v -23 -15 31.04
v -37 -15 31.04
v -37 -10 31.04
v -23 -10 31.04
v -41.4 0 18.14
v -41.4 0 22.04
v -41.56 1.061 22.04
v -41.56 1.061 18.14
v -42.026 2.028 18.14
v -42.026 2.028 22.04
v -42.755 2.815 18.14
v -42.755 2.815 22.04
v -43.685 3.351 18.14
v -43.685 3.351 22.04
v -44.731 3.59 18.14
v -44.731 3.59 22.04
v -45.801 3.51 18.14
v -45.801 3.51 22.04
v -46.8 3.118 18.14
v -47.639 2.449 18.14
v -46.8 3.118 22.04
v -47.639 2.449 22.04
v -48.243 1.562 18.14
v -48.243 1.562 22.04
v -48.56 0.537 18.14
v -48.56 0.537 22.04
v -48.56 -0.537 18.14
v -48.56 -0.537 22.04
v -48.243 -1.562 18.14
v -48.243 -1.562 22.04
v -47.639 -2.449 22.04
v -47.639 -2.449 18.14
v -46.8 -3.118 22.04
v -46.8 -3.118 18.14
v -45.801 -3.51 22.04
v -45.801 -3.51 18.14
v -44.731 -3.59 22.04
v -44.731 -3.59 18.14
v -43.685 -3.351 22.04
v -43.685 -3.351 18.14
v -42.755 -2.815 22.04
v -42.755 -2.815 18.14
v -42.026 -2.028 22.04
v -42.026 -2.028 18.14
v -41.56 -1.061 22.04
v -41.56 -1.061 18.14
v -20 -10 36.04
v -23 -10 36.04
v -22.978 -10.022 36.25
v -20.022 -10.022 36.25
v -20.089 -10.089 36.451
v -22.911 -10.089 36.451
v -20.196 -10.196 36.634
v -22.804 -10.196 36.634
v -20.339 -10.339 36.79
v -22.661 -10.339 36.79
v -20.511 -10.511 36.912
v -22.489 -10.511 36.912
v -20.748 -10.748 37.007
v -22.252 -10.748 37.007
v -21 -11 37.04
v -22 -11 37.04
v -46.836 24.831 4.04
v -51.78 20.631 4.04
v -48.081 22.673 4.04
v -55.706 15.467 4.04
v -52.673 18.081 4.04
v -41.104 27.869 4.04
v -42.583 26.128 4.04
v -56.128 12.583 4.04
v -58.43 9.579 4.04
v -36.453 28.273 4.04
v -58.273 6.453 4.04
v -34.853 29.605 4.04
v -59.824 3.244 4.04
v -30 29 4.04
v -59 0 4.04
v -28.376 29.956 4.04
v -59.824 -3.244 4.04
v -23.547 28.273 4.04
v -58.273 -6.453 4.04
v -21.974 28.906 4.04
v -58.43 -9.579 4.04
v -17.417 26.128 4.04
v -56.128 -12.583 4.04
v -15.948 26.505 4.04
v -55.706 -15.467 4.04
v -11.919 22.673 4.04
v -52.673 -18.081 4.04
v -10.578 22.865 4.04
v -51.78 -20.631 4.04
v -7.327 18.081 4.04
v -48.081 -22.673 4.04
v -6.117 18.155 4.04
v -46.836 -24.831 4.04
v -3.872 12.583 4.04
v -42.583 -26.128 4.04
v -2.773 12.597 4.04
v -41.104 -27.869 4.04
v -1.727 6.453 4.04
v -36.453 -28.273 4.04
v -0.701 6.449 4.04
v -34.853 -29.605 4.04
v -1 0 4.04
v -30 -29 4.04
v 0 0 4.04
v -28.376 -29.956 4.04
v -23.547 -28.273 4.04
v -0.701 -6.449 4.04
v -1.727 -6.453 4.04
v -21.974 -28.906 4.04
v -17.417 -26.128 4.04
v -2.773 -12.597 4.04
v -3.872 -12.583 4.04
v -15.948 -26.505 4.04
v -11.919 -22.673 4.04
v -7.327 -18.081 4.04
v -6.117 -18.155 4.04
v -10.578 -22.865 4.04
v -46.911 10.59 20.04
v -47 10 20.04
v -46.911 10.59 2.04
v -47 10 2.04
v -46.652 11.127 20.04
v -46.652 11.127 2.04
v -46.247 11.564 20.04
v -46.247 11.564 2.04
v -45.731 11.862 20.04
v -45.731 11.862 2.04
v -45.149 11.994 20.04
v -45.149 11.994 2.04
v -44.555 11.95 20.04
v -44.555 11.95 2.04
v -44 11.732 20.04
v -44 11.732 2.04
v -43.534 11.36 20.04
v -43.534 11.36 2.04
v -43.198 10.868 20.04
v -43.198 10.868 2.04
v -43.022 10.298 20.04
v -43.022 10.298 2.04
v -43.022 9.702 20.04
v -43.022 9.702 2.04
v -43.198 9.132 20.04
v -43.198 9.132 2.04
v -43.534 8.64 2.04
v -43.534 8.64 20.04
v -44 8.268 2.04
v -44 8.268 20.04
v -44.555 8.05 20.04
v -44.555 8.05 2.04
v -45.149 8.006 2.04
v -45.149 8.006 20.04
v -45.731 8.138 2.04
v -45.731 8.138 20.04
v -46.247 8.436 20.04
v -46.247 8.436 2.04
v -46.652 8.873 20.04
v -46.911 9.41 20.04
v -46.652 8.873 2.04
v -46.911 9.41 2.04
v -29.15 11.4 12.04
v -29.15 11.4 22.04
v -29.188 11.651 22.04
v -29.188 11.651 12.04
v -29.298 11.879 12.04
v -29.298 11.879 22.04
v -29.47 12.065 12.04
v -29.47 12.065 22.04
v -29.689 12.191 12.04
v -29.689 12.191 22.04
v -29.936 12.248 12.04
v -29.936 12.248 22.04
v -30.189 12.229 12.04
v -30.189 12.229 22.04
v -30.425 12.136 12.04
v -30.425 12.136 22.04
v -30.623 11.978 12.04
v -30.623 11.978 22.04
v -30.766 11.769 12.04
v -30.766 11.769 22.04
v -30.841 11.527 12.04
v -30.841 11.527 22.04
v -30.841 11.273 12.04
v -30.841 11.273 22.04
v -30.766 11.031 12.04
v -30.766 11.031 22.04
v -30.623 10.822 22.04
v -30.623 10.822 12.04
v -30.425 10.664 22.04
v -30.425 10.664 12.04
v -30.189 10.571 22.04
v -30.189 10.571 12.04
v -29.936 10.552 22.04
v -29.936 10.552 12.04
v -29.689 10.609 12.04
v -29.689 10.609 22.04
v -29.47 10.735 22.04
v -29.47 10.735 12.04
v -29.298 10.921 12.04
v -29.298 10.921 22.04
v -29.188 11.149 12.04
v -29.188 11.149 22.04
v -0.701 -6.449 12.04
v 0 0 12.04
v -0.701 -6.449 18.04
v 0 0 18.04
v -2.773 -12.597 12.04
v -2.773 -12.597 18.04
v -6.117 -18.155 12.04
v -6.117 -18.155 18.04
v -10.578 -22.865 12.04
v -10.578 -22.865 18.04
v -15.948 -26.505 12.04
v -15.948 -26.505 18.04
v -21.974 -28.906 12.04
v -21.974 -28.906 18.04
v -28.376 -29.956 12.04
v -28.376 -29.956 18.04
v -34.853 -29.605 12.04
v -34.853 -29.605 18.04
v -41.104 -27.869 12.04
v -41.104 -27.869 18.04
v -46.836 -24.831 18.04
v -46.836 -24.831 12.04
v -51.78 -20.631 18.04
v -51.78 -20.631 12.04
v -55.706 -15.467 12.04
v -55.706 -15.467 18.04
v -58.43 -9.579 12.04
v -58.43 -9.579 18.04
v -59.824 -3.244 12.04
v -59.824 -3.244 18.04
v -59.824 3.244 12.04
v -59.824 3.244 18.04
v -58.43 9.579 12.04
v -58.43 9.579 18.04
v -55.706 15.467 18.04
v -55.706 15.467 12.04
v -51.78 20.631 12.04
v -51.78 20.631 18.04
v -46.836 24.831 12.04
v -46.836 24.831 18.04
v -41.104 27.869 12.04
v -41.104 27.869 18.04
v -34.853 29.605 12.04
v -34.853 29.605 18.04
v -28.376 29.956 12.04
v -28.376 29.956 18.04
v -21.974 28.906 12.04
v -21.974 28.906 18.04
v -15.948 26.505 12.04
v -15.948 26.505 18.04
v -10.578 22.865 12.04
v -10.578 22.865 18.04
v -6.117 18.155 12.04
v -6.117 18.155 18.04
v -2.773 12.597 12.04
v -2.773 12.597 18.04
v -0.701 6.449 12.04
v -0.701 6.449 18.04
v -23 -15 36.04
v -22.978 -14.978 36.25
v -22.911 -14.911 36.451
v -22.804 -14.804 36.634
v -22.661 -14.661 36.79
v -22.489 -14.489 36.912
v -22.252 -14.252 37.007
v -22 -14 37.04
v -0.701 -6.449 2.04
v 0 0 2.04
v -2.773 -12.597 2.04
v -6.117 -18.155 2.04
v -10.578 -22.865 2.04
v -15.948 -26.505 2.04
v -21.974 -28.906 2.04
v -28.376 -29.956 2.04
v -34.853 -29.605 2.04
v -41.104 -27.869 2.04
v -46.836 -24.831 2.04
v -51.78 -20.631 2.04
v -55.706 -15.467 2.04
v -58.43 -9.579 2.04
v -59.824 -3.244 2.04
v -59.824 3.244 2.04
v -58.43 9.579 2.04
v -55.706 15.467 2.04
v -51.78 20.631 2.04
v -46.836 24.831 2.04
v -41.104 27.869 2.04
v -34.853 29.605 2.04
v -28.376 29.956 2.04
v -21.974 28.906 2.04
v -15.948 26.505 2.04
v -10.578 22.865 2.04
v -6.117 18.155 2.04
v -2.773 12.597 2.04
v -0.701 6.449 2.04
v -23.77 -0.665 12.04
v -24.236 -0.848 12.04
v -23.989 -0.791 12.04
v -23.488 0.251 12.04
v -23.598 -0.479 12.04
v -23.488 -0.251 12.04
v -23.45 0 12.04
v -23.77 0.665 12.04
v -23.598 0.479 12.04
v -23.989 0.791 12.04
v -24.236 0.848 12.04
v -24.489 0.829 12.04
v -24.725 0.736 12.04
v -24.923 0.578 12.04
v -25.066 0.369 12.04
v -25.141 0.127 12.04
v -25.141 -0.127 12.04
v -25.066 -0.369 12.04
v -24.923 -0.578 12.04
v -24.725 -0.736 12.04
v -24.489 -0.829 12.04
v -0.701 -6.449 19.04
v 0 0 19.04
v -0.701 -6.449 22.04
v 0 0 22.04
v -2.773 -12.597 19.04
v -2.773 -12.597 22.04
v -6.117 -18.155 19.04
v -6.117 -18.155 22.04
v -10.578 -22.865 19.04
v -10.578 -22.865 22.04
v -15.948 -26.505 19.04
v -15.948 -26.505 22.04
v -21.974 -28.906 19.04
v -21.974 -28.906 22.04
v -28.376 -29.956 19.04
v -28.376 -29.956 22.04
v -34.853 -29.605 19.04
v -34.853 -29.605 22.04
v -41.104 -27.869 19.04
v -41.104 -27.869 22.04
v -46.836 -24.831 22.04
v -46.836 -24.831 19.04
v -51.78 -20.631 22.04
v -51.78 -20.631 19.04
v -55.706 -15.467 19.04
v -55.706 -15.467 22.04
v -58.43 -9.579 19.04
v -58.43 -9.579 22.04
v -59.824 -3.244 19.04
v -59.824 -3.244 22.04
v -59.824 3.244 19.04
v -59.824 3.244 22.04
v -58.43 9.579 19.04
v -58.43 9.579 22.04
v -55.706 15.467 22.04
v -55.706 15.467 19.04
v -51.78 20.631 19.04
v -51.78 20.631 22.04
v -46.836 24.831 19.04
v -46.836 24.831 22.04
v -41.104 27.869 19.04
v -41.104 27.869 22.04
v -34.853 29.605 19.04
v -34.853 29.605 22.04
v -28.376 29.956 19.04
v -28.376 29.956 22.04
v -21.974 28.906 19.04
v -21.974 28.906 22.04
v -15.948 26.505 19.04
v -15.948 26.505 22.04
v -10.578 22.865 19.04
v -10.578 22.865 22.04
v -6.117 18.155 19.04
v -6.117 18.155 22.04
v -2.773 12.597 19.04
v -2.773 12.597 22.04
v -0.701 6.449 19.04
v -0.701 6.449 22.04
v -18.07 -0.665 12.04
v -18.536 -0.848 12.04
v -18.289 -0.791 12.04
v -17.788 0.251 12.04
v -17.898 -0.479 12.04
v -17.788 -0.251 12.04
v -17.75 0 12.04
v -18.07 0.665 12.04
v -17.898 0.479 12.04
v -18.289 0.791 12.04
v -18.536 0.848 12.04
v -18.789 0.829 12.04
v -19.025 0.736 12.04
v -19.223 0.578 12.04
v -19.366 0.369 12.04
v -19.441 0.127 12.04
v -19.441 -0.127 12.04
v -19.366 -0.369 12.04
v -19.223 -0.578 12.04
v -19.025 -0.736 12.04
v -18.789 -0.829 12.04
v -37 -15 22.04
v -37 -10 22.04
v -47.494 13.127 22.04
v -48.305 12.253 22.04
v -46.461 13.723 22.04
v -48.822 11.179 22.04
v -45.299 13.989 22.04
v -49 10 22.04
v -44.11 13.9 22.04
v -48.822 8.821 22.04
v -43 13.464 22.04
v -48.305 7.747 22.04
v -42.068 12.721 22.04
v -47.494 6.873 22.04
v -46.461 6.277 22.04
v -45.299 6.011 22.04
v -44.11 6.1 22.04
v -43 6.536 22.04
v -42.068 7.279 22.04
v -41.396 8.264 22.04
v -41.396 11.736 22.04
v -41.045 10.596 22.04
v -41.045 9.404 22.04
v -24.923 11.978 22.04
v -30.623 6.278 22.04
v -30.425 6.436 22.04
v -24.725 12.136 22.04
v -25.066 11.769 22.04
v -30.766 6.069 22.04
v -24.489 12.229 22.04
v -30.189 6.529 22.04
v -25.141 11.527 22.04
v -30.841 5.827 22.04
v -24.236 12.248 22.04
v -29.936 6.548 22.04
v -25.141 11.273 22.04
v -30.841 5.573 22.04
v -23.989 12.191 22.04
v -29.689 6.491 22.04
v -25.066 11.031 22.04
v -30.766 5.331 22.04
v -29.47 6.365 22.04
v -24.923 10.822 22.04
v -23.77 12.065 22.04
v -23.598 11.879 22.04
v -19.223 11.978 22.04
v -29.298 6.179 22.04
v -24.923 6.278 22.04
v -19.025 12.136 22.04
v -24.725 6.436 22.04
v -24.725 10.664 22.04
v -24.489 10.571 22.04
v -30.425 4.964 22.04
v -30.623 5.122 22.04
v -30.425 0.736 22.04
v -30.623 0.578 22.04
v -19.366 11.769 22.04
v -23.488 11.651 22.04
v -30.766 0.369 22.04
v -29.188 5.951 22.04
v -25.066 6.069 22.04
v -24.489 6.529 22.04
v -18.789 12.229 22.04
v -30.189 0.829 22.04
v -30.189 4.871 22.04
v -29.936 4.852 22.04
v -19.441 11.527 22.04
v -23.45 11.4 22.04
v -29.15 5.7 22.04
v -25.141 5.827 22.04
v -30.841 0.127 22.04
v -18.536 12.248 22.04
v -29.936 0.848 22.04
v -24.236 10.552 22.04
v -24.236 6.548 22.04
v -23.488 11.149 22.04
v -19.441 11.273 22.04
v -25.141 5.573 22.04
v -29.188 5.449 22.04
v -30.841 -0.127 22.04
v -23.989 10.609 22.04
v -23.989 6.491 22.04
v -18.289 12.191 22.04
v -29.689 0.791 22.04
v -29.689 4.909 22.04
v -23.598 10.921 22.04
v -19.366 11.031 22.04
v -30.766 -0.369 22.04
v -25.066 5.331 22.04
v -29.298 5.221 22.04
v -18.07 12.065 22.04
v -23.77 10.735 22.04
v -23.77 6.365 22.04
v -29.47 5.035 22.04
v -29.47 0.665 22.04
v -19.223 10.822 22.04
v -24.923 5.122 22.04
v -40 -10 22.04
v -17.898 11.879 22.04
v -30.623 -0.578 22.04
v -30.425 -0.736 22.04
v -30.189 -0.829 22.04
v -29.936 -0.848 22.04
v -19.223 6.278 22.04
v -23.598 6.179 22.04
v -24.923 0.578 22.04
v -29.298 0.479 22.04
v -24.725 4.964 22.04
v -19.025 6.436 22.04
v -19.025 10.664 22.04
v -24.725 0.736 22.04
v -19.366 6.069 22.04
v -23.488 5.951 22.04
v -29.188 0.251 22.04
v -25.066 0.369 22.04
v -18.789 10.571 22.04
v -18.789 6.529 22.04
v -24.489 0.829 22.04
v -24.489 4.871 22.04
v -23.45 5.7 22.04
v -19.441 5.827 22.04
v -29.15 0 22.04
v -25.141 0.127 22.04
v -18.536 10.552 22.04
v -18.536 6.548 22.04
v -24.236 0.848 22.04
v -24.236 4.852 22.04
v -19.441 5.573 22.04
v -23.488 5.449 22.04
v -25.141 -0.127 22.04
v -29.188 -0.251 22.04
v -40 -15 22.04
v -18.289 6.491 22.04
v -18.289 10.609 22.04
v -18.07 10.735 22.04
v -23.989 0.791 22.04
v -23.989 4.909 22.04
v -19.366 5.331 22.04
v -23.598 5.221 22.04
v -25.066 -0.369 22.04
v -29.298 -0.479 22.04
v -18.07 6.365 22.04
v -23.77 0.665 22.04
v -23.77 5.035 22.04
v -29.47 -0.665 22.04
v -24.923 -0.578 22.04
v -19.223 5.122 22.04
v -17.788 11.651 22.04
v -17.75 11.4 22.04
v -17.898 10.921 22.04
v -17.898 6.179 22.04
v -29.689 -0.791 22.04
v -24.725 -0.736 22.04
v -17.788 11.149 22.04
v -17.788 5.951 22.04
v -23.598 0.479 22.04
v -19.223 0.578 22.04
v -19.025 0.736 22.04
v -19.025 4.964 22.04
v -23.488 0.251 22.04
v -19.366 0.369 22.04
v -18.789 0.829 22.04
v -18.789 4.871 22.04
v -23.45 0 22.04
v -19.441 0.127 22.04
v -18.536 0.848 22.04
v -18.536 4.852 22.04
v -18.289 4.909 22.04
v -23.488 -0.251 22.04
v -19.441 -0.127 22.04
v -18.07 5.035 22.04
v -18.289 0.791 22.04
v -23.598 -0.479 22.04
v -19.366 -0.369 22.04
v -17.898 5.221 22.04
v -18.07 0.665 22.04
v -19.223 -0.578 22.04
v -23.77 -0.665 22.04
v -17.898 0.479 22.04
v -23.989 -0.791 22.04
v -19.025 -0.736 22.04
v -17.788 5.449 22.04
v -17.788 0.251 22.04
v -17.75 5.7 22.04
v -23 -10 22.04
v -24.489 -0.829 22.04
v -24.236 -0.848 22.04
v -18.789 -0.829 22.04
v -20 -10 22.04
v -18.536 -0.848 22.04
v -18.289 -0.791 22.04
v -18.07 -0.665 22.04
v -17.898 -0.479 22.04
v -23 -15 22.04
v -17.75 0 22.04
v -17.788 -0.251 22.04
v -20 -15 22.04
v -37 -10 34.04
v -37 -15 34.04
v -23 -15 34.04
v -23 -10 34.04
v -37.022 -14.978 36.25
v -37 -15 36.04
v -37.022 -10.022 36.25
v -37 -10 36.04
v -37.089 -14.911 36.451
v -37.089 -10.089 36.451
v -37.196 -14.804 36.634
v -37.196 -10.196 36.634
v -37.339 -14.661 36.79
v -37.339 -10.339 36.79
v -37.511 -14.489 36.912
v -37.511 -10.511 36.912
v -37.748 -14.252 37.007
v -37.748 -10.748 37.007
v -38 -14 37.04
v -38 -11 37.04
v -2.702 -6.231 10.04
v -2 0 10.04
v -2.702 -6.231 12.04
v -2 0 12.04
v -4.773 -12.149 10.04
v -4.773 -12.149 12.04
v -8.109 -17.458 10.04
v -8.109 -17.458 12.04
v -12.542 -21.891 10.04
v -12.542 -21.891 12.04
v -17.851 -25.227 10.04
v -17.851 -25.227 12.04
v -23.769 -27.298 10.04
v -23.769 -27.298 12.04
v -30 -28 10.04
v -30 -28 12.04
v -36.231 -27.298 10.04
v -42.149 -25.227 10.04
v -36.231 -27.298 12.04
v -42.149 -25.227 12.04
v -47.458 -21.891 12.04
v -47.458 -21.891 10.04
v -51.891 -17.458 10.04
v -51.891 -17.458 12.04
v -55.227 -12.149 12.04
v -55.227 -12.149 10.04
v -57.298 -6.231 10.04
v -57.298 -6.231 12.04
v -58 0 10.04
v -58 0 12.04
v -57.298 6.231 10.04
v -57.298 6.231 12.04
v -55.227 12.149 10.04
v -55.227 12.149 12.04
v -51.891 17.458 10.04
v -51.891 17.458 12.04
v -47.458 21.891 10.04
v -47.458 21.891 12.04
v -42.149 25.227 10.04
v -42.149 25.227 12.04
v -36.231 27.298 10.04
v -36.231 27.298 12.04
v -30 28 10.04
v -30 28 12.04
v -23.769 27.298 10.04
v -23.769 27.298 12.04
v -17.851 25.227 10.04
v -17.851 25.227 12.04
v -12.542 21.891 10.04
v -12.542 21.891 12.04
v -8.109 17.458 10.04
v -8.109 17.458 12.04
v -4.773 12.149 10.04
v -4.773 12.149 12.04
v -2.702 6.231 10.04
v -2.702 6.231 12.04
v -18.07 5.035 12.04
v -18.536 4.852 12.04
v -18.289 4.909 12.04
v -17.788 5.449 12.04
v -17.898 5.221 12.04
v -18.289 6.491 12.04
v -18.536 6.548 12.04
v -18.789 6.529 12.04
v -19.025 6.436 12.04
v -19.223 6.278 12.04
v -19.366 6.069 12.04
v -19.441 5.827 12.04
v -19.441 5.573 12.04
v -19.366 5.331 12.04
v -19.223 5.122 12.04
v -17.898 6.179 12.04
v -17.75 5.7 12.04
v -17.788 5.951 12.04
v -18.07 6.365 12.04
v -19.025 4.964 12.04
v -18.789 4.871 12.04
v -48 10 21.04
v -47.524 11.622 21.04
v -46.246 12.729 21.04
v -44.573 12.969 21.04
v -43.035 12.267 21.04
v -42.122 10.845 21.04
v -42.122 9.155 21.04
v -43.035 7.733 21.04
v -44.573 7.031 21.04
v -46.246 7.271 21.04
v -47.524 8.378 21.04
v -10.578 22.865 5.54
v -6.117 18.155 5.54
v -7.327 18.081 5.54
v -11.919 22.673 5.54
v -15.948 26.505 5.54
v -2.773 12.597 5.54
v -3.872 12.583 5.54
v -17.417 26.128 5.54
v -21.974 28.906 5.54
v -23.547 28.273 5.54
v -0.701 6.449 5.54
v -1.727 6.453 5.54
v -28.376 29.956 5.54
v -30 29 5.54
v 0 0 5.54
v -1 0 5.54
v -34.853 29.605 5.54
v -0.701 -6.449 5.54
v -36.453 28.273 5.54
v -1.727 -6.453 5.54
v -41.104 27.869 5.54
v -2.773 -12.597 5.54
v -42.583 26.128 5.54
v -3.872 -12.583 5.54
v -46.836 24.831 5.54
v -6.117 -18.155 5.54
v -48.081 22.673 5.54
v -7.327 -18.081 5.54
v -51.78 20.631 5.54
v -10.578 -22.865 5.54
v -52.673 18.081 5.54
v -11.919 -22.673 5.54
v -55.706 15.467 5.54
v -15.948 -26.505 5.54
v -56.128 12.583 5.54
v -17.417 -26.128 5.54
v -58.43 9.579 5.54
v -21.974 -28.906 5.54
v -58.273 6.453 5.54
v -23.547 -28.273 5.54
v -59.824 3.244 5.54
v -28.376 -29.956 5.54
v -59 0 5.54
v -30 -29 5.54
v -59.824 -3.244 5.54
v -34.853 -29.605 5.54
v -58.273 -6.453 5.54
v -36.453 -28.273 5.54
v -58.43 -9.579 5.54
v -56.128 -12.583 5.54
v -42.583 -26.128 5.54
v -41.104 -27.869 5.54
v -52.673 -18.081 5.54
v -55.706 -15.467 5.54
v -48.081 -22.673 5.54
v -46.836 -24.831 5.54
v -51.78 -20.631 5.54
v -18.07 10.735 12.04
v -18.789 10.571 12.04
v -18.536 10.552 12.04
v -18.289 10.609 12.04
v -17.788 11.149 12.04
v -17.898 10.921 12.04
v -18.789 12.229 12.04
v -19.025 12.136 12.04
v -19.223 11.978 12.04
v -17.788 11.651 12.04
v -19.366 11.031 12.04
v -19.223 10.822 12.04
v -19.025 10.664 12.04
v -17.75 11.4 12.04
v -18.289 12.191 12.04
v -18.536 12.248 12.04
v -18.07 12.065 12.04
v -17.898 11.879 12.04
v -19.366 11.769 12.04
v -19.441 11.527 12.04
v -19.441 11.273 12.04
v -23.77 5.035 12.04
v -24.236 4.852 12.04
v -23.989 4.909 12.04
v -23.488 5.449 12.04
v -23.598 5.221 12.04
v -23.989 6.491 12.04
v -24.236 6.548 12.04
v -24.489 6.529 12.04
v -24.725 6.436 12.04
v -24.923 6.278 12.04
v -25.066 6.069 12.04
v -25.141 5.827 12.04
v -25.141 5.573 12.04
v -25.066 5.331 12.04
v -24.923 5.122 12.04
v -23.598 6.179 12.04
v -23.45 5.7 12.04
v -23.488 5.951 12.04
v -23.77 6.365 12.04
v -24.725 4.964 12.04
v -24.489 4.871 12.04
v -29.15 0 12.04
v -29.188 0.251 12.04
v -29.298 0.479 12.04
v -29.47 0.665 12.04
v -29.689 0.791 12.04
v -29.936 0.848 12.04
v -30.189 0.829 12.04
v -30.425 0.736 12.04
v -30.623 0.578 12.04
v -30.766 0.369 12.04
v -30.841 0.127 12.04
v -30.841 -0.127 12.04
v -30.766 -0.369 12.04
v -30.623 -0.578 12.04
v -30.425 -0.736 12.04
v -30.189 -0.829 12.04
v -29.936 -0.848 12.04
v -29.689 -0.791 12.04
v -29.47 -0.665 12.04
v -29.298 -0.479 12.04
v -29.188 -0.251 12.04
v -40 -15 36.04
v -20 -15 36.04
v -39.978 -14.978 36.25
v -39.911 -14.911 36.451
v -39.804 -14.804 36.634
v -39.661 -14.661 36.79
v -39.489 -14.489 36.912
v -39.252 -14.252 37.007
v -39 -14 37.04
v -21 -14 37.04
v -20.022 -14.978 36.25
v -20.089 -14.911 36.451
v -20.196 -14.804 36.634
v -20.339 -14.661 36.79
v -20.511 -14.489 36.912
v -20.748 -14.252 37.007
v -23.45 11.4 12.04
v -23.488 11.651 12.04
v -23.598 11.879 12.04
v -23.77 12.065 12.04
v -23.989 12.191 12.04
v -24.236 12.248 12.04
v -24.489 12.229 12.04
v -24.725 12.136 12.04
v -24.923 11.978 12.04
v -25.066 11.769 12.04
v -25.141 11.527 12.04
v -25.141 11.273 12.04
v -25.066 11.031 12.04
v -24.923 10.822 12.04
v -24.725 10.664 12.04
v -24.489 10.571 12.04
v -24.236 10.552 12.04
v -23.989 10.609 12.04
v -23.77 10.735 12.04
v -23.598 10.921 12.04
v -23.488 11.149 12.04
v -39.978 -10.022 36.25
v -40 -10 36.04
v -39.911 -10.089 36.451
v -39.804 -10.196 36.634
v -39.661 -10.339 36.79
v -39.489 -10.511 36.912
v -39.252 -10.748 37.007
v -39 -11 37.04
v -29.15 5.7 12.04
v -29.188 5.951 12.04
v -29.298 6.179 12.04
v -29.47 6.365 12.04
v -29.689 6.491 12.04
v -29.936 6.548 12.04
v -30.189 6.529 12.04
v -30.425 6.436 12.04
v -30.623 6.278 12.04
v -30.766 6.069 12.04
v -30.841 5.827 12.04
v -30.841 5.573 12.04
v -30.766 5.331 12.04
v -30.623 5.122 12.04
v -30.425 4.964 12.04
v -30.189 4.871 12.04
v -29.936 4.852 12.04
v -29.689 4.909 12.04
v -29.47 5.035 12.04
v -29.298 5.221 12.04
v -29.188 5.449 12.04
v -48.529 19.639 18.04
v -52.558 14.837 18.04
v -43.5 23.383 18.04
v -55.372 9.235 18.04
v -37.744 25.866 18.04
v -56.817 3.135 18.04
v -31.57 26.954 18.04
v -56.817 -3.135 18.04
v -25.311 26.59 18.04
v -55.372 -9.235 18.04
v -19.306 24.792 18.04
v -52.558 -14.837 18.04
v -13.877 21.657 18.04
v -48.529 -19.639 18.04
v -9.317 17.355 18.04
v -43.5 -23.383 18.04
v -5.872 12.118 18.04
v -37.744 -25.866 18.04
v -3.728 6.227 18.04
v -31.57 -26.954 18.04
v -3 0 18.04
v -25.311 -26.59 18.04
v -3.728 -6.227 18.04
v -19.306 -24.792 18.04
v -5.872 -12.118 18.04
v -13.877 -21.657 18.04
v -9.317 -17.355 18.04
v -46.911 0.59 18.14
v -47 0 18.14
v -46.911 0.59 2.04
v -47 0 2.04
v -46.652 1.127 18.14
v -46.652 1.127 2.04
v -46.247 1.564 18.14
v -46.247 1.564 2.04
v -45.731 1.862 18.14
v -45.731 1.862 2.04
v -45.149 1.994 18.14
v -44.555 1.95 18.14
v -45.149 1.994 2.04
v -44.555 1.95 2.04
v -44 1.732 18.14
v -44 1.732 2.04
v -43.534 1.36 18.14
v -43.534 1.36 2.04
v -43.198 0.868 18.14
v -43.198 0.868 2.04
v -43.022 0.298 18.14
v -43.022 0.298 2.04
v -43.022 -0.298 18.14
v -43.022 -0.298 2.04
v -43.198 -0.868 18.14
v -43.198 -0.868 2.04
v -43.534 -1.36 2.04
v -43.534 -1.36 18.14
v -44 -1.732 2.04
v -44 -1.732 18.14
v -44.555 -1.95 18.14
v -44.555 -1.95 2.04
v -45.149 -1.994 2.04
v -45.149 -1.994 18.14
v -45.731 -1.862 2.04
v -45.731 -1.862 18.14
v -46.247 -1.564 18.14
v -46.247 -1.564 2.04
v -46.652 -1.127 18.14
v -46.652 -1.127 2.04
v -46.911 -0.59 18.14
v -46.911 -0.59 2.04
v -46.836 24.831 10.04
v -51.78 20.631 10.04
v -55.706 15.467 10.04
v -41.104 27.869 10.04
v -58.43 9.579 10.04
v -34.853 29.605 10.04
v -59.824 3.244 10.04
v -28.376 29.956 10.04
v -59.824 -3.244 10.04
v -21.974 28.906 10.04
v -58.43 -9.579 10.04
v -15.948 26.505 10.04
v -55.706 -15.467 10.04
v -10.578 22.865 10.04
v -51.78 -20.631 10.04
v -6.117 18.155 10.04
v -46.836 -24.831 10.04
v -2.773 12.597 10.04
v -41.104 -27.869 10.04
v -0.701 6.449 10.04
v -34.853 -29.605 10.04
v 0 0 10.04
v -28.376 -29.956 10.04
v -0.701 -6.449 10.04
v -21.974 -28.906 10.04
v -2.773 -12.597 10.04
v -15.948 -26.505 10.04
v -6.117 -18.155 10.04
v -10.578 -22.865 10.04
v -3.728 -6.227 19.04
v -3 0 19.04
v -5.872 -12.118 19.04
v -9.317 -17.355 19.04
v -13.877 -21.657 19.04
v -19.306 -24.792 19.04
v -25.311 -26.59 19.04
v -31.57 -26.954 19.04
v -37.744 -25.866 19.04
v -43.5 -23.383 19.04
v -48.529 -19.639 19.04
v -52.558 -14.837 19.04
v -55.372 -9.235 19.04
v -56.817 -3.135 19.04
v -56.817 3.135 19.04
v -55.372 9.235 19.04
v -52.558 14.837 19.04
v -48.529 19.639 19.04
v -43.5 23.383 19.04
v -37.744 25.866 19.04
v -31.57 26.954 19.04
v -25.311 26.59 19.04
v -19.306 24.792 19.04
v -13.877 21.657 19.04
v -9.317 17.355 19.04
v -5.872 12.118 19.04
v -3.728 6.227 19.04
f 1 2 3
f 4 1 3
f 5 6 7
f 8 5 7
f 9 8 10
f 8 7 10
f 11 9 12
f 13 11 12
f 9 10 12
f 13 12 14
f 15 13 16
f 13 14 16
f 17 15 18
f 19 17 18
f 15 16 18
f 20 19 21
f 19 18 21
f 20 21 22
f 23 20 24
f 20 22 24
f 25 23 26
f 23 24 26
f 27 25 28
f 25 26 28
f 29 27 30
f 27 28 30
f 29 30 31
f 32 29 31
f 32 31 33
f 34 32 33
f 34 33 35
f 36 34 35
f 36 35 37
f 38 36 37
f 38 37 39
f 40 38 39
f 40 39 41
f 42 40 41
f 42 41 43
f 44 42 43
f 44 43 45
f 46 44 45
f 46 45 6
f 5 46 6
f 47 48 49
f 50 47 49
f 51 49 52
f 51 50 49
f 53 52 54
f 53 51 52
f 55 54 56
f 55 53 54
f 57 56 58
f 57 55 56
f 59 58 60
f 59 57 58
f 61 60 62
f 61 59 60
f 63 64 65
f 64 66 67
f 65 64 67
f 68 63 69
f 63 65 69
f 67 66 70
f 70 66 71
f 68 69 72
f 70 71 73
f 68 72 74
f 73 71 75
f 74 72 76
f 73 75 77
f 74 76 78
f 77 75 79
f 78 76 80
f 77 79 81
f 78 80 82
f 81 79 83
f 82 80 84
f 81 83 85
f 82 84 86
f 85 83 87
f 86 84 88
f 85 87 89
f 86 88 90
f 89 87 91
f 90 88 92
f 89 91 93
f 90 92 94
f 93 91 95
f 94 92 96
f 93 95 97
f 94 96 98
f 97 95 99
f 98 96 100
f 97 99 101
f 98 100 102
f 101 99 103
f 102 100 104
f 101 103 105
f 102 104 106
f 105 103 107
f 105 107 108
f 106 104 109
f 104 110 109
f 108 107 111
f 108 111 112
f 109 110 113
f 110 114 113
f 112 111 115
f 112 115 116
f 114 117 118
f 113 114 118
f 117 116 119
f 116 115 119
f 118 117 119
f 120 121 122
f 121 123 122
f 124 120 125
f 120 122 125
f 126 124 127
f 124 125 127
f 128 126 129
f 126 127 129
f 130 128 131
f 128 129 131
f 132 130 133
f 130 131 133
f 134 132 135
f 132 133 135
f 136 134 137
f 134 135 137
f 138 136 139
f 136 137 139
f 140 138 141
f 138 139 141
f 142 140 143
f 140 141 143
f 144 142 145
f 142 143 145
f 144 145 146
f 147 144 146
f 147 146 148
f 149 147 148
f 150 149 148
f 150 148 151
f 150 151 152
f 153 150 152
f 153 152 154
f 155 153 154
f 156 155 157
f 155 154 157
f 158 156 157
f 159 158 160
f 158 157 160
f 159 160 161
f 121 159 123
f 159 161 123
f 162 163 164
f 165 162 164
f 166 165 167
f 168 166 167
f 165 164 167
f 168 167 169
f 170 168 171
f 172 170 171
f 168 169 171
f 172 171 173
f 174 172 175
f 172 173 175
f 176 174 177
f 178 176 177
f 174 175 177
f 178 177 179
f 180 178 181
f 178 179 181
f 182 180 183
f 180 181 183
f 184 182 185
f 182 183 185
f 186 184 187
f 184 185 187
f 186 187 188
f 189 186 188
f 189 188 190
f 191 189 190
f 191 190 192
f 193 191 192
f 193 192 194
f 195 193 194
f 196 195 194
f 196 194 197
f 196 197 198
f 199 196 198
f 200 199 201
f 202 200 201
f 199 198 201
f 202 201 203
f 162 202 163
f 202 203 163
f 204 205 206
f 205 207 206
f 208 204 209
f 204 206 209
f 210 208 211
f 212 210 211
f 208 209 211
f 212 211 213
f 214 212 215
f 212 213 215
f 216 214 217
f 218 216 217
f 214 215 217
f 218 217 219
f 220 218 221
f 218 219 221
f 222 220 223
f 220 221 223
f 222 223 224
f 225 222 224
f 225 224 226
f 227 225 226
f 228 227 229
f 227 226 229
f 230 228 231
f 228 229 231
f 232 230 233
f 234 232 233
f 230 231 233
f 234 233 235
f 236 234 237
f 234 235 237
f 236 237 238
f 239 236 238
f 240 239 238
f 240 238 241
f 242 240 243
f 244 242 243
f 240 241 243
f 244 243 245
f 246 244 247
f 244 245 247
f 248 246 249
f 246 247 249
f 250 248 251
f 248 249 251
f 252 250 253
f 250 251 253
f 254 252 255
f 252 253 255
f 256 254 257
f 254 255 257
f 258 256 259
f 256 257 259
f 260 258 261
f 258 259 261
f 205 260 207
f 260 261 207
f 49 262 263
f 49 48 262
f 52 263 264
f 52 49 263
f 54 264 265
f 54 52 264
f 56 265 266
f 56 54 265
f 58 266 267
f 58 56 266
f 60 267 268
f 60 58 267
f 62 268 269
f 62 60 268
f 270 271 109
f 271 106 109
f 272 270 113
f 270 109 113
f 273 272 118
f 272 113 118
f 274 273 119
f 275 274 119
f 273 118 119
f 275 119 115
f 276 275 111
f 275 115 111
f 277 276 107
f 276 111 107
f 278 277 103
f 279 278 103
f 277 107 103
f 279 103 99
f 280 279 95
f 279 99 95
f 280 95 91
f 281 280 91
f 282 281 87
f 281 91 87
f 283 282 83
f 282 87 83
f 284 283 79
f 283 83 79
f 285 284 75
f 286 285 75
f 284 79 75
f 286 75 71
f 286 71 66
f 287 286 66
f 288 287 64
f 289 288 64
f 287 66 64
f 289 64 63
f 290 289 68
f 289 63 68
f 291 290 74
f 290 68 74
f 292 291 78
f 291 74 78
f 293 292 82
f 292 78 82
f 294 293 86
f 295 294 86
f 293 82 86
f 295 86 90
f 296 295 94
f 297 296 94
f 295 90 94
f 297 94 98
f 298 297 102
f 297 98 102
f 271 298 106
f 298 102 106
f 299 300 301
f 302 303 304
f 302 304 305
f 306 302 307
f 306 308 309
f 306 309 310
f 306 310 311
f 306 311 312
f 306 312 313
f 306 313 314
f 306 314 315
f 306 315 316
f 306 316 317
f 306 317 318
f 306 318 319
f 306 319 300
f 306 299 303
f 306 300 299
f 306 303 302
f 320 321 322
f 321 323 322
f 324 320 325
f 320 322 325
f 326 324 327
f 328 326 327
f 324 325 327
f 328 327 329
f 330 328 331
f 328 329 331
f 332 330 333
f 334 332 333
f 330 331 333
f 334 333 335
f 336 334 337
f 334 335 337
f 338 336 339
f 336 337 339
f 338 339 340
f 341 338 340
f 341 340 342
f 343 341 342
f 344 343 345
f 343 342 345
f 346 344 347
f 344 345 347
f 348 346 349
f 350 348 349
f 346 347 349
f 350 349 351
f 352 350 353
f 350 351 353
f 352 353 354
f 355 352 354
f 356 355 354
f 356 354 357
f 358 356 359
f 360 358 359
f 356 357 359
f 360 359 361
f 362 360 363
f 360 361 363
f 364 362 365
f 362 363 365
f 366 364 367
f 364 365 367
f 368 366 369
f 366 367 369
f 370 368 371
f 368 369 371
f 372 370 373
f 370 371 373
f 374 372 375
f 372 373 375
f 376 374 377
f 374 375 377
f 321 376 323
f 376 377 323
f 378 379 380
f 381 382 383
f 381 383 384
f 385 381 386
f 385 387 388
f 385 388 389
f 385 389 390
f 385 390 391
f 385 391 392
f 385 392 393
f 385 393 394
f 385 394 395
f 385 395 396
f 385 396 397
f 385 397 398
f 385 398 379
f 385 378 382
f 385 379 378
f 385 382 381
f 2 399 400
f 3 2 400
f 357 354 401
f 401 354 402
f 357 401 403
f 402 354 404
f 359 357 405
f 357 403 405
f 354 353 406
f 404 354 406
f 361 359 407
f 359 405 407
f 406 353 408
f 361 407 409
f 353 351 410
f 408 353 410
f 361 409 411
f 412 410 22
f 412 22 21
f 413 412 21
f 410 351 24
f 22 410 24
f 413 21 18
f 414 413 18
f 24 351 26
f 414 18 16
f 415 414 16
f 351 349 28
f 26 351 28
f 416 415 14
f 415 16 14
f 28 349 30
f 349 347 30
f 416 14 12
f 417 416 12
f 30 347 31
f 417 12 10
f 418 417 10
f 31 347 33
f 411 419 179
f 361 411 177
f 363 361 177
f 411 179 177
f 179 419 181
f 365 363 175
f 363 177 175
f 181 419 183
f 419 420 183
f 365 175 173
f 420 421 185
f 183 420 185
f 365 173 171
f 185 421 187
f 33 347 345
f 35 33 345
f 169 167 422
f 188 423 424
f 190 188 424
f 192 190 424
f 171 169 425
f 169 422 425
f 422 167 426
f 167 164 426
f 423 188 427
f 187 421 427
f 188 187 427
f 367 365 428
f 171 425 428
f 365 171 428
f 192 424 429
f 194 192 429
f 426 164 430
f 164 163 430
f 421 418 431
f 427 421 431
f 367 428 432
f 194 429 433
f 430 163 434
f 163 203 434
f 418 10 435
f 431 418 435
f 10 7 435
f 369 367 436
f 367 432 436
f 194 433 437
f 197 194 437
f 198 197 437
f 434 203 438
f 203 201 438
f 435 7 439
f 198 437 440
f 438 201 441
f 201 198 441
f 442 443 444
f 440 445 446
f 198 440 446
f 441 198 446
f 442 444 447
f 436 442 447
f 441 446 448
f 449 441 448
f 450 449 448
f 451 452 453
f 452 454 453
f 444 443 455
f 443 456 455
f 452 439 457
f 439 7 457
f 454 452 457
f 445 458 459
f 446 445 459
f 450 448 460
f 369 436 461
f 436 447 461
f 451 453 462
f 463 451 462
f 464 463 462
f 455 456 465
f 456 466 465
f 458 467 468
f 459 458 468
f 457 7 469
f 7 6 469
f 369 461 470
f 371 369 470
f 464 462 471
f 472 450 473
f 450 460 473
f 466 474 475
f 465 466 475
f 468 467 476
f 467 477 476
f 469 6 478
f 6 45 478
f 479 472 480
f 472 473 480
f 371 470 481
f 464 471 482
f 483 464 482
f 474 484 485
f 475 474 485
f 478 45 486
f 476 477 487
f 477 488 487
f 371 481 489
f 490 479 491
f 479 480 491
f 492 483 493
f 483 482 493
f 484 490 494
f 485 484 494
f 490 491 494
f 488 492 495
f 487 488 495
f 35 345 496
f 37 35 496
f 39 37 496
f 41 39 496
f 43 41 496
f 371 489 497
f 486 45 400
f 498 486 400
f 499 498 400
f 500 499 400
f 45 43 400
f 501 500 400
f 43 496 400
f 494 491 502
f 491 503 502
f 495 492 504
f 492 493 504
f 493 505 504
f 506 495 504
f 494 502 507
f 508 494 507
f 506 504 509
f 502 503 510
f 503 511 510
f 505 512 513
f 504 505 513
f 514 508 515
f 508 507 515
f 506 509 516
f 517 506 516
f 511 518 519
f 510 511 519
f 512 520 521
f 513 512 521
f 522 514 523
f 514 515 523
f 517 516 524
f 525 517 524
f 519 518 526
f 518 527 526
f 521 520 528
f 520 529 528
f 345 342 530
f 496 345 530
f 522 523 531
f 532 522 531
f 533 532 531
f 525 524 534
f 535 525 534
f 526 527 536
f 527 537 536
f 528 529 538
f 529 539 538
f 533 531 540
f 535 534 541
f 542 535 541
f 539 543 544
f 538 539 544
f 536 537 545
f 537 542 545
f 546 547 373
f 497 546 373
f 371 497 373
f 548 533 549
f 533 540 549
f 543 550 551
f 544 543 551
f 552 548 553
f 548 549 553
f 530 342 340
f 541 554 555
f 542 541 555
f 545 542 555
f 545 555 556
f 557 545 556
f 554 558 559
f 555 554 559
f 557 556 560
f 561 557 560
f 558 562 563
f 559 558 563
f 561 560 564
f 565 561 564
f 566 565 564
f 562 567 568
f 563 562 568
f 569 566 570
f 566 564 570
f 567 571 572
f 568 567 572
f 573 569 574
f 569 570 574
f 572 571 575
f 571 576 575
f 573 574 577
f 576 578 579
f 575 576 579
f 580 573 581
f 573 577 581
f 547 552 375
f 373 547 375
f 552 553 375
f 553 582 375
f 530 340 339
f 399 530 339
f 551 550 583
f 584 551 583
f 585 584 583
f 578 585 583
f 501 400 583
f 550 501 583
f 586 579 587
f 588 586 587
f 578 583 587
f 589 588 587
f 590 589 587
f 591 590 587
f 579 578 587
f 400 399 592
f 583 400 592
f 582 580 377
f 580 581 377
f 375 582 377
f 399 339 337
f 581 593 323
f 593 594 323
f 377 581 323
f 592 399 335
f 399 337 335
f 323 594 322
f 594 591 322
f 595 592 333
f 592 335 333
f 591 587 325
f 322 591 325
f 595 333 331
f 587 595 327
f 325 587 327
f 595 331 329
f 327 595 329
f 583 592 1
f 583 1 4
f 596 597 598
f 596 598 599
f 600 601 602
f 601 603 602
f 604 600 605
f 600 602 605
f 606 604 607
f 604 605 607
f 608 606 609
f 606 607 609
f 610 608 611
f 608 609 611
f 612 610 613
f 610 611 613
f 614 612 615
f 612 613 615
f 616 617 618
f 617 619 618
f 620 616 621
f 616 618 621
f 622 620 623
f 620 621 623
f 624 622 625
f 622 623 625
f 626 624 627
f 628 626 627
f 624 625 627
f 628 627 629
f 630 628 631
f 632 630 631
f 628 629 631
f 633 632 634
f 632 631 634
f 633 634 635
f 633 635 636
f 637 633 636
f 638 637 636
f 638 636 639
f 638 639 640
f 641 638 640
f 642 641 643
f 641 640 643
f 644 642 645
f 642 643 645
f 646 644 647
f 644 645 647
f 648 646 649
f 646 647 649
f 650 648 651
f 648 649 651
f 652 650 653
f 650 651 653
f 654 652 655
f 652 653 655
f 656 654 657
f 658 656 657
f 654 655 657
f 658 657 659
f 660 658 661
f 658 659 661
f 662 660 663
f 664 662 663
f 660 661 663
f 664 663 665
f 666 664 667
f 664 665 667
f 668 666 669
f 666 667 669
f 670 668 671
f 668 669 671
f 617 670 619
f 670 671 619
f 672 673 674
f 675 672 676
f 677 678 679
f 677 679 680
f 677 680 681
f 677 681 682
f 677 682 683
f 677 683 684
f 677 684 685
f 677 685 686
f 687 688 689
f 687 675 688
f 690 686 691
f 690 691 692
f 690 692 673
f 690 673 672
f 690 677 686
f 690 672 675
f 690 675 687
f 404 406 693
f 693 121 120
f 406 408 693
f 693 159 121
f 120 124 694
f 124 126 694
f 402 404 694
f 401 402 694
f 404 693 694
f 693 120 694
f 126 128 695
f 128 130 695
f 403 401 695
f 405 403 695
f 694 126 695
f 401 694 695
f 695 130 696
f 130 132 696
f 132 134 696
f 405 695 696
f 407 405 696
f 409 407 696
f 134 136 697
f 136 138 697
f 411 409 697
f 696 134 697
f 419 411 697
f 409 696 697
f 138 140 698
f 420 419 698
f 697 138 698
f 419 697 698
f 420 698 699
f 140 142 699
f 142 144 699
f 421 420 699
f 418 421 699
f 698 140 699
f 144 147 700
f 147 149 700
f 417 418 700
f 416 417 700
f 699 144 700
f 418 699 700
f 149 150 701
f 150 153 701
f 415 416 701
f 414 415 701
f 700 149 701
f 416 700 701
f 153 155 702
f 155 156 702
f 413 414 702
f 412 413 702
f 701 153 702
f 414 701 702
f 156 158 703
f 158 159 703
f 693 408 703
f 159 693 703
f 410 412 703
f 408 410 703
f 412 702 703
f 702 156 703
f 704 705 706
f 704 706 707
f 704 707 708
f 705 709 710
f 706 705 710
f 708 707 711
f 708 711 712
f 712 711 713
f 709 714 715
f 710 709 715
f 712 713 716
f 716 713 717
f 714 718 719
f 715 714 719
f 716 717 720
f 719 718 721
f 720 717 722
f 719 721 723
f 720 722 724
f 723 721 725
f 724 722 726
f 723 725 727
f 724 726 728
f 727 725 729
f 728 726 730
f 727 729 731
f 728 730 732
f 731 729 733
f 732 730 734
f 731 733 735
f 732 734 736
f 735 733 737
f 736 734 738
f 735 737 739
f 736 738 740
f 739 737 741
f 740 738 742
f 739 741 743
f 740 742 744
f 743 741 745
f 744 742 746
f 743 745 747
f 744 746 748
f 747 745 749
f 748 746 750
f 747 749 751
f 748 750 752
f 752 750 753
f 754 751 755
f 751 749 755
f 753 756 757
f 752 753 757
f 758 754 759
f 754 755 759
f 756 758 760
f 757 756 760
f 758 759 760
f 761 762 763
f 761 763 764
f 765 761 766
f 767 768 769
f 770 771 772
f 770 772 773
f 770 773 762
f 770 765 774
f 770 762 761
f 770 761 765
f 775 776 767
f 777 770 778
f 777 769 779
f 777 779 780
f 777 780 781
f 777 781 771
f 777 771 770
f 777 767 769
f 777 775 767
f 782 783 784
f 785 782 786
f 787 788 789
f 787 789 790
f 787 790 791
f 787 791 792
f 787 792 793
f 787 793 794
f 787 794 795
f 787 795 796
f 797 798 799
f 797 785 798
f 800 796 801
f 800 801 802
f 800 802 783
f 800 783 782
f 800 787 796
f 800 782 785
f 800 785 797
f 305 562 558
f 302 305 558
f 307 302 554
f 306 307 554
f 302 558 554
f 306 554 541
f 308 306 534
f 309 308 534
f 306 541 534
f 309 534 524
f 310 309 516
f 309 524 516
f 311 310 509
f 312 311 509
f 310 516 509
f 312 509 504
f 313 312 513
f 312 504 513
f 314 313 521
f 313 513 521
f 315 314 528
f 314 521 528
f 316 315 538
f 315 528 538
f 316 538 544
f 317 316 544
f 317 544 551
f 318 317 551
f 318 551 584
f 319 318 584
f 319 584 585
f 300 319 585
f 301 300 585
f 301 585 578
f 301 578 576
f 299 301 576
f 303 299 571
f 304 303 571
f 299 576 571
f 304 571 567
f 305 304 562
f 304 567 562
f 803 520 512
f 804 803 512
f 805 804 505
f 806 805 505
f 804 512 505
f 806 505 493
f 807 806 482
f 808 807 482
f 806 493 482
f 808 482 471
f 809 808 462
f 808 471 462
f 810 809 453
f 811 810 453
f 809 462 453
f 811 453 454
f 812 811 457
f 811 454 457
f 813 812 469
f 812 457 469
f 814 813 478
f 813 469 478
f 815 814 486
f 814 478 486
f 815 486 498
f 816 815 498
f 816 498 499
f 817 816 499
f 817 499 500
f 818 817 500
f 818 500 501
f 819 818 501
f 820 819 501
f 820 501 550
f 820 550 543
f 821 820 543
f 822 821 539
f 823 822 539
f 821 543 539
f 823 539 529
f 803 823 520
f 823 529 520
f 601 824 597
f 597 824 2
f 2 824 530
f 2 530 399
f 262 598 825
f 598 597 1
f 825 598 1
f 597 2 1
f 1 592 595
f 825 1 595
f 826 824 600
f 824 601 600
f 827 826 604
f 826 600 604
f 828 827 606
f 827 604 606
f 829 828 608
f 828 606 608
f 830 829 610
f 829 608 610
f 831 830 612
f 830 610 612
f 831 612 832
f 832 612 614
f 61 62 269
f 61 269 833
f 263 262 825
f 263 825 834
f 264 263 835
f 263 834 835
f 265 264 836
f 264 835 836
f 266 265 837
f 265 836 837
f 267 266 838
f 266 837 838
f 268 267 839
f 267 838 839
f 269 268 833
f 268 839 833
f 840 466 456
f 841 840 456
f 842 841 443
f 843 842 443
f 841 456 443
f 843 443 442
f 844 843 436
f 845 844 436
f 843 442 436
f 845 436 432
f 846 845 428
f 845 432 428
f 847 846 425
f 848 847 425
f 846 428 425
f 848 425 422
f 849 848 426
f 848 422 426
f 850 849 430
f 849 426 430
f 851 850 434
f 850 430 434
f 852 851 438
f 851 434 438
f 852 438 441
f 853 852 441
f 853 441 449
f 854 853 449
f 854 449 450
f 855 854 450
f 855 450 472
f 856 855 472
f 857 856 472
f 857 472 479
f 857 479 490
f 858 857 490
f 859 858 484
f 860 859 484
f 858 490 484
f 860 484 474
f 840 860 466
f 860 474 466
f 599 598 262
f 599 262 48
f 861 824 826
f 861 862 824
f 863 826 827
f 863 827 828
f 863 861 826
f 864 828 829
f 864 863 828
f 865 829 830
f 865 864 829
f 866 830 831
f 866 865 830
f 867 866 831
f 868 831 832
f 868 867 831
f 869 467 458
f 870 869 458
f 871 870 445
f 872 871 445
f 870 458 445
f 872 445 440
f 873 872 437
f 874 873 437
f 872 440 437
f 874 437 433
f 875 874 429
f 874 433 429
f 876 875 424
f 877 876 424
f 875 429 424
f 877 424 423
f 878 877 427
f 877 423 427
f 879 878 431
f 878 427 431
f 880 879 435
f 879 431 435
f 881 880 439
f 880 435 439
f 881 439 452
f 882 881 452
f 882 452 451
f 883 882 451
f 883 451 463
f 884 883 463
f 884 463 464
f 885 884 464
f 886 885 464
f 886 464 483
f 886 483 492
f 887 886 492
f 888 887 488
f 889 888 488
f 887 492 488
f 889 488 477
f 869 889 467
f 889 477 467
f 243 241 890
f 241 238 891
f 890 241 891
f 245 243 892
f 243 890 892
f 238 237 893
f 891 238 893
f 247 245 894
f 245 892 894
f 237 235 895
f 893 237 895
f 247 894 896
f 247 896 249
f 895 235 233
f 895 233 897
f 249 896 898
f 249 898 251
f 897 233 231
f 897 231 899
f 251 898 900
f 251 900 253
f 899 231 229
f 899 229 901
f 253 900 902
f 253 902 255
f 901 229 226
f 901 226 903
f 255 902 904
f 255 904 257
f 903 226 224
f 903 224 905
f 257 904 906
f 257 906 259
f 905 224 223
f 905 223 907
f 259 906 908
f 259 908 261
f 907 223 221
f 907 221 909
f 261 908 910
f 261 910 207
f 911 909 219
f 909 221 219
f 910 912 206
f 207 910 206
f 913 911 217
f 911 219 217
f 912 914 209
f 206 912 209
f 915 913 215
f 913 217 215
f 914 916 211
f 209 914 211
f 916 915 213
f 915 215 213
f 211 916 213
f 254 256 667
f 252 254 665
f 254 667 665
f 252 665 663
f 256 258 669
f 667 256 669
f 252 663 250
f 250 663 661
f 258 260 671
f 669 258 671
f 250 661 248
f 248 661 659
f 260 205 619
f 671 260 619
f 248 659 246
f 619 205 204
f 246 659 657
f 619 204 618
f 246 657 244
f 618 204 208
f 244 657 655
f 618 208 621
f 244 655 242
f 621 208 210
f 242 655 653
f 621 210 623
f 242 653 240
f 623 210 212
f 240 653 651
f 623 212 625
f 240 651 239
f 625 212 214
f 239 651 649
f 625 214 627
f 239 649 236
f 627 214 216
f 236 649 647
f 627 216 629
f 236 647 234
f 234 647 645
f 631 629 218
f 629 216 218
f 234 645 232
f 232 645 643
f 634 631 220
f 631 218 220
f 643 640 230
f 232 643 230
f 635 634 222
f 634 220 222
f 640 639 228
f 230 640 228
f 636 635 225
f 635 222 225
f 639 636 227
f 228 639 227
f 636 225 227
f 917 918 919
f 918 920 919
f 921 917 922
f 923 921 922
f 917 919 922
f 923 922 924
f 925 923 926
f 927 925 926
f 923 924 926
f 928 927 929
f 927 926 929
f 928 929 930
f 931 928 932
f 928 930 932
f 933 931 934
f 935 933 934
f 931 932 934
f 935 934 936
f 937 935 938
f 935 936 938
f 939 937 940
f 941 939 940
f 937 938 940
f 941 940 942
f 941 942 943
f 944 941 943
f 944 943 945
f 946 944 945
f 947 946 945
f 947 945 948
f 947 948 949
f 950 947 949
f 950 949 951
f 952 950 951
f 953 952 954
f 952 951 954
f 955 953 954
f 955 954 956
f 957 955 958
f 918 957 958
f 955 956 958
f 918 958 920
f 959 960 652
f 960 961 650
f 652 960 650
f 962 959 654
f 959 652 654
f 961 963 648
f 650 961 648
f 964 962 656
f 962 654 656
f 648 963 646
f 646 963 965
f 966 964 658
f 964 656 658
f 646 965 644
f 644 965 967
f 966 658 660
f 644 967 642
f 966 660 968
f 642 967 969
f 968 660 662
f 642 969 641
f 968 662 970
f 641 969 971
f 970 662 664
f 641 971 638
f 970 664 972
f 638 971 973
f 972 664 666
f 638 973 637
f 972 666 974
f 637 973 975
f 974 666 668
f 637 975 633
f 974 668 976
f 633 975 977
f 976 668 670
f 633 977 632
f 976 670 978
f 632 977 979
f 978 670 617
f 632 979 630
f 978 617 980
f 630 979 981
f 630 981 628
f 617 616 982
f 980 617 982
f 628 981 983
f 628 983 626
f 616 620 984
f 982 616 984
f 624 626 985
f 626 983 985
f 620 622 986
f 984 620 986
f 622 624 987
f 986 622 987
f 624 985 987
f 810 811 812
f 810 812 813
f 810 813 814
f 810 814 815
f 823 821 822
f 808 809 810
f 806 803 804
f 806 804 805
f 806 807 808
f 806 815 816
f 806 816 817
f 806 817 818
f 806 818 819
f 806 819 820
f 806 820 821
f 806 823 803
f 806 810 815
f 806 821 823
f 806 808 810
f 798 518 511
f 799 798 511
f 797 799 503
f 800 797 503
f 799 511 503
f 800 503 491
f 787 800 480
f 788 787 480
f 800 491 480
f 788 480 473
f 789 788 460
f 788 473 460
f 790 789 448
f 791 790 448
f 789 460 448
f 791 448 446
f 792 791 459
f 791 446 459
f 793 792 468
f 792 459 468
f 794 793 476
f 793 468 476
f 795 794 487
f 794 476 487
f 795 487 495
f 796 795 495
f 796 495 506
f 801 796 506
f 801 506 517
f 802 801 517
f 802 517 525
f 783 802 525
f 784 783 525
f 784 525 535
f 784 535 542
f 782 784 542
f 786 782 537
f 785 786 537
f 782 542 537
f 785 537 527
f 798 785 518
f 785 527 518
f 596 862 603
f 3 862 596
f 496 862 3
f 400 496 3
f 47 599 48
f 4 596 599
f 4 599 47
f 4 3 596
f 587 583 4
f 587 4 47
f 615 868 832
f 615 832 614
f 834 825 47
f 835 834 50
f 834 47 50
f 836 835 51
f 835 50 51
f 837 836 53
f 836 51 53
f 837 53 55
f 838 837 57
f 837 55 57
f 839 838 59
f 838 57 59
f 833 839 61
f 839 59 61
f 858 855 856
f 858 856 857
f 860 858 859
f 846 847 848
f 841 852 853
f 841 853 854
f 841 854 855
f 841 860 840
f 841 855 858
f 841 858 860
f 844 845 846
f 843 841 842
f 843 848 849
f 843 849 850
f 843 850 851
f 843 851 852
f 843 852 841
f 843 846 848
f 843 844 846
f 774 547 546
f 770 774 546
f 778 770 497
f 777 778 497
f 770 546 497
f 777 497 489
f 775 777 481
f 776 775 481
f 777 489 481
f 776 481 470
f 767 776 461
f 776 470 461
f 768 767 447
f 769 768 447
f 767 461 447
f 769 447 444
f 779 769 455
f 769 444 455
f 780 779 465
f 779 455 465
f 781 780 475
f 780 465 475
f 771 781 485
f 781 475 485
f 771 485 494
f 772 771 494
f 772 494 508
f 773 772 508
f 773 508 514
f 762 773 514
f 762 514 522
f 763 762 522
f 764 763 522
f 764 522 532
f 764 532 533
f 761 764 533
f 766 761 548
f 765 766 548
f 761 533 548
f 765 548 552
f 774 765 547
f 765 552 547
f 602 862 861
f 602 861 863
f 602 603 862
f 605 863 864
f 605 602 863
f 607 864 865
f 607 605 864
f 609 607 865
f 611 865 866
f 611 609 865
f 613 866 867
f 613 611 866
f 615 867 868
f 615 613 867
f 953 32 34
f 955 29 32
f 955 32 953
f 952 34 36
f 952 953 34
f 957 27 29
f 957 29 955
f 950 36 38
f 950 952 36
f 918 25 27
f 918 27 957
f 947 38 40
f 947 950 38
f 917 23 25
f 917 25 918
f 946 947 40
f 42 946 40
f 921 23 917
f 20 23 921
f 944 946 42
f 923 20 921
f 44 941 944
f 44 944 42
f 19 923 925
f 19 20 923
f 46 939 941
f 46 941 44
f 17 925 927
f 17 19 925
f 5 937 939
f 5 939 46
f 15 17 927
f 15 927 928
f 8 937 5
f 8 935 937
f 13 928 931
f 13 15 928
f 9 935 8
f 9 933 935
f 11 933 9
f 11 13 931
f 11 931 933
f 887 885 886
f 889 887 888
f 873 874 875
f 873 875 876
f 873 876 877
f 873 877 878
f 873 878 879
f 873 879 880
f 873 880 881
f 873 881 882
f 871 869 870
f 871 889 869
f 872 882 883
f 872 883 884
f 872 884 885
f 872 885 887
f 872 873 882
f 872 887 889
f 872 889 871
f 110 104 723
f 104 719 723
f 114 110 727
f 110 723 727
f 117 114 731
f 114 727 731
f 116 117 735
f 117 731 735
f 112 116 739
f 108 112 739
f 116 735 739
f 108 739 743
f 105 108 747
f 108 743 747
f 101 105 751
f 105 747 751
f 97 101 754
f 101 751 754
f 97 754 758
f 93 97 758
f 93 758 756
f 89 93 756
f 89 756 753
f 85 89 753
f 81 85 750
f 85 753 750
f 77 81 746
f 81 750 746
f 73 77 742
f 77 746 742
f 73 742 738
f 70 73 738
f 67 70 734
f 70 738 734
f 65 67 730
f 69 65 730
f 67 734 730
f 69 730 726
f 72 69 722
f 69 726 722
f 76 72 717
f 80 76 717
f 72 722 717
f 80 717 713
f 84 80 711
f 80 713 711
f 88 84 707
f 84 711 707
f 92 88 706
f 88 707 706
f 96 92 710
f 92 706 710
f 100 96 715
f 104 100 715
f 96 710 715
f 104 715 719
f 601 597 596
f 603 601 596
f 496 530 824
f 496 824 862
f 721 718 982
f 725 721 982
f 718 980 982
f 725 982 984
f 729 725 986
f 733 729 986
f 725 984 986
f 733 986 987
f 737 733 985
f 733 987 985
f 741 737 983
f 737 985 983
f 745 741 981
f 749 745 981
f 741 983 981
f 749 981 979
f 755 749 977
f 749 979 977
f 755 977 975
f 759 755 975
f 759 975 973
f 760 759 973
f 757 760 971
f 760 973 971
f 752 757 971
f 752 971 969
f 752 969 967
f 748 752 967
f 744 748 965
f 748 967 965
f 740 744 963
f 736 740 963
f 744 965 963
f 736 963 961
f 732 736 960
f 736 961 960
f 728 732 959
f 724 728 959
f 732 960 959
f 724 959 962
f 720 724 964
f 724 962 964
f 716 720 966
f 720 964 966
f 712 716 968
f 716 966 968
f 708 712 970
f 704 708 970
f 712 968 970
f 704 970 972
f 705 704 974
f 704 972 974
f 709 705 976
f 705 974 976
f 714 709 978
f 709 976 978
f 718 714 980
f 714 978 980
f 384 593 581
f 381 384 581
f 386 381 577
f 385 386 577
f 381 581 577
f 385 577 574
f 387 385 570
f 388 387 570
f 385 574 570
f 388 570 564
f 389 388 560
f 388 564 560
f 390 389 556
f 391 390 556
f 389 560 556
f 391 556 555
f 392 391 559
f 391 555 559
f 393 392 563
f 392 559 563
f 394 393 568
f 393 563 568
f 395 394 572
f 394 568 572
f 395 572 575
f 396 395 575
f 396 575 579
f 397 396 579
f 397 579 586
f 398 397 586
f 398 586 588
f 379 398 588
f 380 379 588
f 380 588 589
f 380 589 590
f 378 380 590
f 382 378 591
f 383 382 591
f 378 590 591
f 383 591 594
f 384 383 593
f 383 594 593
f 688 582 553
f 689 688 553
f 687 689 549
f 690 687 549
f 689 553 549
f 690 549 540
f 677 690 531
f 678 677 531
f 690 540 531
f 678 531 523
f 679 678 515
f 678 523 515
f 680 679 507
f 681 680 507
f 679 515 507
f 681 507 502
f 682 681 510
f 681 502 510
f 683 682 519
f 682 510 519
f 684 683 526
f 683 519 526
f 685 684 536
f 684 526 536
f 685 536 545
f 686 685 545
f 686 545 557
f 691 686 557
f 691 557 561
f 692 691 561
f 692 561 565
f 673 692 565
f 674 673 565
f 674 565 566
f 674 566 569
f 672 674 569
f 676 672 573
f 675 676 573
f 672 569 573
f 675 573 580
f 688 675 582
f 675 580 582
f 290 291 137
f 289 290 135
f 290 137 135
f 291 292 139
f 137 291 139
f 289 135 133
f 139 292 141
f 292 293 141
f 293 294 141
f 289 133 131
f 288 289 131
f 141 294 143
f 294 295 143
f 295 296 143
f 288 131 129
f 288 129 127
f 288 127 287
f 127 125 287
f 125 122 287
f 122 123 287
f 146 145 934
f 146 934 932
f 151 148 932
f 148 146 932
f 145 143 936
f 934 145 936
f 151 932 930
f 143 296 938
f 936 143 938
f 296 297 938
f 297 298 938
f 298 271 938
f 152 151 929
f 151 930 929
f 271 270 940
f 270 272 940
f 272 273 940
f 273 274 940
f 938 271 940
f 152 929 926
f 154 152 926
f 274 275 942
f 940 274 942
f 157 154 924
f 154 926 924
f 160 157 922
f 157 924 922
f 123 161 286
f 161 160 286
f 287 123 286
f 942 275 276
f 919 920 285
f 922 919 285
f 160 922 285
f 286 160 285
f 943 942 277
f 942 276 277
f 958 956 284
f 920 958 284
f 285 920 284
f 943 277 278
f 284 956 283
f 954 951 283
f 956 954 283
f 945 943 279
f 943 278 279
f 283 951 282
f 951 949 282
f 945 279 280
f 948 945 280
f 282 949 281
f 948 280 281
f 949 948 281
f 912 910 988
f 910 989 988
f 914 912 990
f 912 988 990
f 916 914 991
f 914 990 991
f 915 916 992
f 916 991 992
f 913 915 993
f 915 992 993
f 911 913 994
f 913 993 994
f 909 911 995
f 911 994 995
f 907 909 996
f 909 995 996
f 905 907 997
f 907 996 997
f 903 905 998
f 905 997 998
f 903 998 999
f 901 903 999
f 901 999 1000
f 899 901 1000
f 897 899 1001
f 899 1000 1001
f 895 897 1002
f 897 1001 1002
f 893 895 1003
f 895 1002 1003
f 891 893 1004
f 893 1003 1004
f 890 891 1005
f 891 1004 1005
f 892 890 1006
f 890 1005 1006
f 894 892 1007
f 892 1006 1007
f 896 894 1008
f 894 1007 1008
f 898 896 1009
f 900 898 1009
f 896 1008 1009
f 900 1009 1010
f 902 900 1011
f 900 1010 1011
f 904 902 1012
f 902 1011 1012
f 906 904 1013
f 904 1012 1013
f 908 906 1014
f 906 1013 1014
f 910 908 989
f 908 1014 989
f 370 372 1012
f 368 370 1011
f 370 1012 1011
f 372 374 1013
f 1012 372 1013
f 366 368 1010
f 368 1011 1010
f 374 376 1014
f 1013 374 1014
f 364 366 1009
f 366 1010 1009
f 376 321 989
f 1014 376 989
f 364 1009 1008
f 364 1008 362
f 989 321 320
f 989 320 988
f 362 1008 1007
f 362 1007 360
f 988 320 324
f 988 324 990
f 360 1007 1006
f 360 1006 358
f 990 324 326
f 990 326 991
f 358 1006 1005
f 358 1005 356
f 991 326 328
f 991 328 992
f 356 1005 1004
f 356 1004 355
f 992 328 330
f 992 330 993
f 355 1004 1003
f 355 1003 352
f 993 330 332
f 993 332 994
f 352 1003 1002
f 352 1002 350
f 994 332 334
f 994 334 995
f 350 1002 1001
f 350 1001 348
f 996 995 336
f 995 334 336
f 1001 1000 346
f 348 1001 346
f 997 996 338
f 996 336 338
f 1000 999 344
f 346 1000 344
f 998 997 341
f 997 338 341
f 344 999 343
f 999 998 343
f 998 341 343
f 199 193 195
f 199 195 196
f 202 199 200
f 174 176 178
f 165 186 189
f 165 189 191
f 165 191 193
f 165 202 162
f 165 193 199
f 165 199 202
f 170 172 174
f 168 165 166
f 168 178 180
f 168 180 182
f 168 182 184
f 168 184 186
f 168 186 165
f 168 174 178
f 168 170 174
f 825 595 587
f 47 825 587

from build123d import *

# Parameters (mm, degrees)
F2_R           = 0.85
F3_DEPTH       = 10
F2_W           = 3
F2_H           = 5
F4_DEPTH       = 15
F6_R           = 1
F7_D           = 4
F7_CBORE_D     = 7.2
F7_CBORE_DEPTH = 3.9
F8_D           = 4
F8_DEPTH       = 20
F8_CSINK_D     = 8
F8_CSINK_ANGLE = 90
F8_TIP         = 1.2017212381
F5_W           = 5
F5_H           = 3
F9_DEPTH       = 14


# Not quite as in the source:
# - a feature of the source that left no trace in its solid (it failed there, or was rolled back) is left out


with BuildPart() as f1:
    # F0 (on Front) → F1 (revolve)
    with BuildSketch(Plane.XZ):
        Polygon((0, 22.0396561921), (-30, 22.0396561921), (-30, 2.0396561921), (0, 2.0396561921), (0, 4.0396561921), (-1, 4.0396561921), (-1, 5.5396561921), (0, 5.5396561921), (0, 10.0396561921), (-2, 10.0396561921), (-2, 12.0396561921), (0, 12.0396561921), (0, 18.0396561921), (-3, 18.0396561921), (-3, 19.0396561921), (0, 19.0396561921), align=None)
    revolve(axis=Axis((-30, 0, 12.0396561921), (0, 0, -1)))

    # F2 (on face) → F3 (cut)
    with BuildSketch(Plane.XY.offset(22.0396561921)):
        with BuildLine():
            ThreePointArc((-30.85, 0), (-30, -0.85), (-29.15, 0))
            ThreePointArc((-29.15, 0), (-30, 0.85), (-30.85, 0))
        make_face()
        with Locations((-30, 5.7)):
            Circle(F2_R)
        with Locations((-30, 11.4)):
            Circle(F2_R)
        with Locations((-24.3, 0)):
            Circle(F2_R)
        with Locations((-24.3, 5.7)):
            Circle(F2_R)
        with Locations((-24.3, 11.4)):
            Circle(F2_R)
        with Locations((-18.6, 0)):
            Circle(F2_R)
        with Locations((-18.6, 5.7)):
            Circle(F2_R)
        with Locations((-18.6, 11.4)):
            Circle(F2_R)
    extrude(amount=-F3_DEPTH, mode=Mode.SUBTRACT)

    # F2 (on face) → F4 (join)
    with BuildSketch(Plane.XY.offset(22.0396561921)):
        with Locations((-21.5, -12.5)):
            Rectangle(F2_W, F2_H)
        with Locations((-38.5, -12.5)):
            Rectangle(F2_W, F2_H)
    extrude(amount=F4_DEPTH)

    # F6
    f6_edges = [f1.edges().sort_by_distance(p)[0] for p in [
        (-38.5, -10, 37.039656),
        (-40, -12.5, 37.039656),
        (-38.5, -15, 37.039656),
        (-37, -12.5, 37.039656),
        (-23, -12.5, 37.039656),
        (-21.5, -15, 37.039656),
        (-20, -12.5, 37.039656),
        (-21.5, -10, 37.039656),
    ]]
    fillet(f6_edges, radius=F6_R)

    # F7 (through all)
    with Locations(Plane.XY.offset(22.0396561921)):
        with Locations((-45, 0)):
            CounterBoreHole(F7_D / 2, F7_CBORE_D / 2, F7_CBORE_DEPTH)

    # F8
    with Locations(Plane.XY.offset(22.0396561921)):
        with Locations((-45, 10)):
            CounterSinkHole(F8_D / 2, F8_CSINK_D / 2, depth=F8_DEPTH, counter_sink_angle=F8_CSINK_ANGLE)
            with Locations((0, 0, -(F8_DEPTH + F8_TIP / 2))):  # 118° drill point
                Cone(0, F8_D / 2, F8_TIP, mode=Mode.SUBTRACT)

    # F5 (on face) → F9 (join)
    with BuildSketch(Plane.YZ.offset(-37)):
        with Locations((-12.5, 32.5396561921)):
            Rectangle(F5_W, F5_H)
    extrude(amount=F9_DEPTH)


solid = f1.part
